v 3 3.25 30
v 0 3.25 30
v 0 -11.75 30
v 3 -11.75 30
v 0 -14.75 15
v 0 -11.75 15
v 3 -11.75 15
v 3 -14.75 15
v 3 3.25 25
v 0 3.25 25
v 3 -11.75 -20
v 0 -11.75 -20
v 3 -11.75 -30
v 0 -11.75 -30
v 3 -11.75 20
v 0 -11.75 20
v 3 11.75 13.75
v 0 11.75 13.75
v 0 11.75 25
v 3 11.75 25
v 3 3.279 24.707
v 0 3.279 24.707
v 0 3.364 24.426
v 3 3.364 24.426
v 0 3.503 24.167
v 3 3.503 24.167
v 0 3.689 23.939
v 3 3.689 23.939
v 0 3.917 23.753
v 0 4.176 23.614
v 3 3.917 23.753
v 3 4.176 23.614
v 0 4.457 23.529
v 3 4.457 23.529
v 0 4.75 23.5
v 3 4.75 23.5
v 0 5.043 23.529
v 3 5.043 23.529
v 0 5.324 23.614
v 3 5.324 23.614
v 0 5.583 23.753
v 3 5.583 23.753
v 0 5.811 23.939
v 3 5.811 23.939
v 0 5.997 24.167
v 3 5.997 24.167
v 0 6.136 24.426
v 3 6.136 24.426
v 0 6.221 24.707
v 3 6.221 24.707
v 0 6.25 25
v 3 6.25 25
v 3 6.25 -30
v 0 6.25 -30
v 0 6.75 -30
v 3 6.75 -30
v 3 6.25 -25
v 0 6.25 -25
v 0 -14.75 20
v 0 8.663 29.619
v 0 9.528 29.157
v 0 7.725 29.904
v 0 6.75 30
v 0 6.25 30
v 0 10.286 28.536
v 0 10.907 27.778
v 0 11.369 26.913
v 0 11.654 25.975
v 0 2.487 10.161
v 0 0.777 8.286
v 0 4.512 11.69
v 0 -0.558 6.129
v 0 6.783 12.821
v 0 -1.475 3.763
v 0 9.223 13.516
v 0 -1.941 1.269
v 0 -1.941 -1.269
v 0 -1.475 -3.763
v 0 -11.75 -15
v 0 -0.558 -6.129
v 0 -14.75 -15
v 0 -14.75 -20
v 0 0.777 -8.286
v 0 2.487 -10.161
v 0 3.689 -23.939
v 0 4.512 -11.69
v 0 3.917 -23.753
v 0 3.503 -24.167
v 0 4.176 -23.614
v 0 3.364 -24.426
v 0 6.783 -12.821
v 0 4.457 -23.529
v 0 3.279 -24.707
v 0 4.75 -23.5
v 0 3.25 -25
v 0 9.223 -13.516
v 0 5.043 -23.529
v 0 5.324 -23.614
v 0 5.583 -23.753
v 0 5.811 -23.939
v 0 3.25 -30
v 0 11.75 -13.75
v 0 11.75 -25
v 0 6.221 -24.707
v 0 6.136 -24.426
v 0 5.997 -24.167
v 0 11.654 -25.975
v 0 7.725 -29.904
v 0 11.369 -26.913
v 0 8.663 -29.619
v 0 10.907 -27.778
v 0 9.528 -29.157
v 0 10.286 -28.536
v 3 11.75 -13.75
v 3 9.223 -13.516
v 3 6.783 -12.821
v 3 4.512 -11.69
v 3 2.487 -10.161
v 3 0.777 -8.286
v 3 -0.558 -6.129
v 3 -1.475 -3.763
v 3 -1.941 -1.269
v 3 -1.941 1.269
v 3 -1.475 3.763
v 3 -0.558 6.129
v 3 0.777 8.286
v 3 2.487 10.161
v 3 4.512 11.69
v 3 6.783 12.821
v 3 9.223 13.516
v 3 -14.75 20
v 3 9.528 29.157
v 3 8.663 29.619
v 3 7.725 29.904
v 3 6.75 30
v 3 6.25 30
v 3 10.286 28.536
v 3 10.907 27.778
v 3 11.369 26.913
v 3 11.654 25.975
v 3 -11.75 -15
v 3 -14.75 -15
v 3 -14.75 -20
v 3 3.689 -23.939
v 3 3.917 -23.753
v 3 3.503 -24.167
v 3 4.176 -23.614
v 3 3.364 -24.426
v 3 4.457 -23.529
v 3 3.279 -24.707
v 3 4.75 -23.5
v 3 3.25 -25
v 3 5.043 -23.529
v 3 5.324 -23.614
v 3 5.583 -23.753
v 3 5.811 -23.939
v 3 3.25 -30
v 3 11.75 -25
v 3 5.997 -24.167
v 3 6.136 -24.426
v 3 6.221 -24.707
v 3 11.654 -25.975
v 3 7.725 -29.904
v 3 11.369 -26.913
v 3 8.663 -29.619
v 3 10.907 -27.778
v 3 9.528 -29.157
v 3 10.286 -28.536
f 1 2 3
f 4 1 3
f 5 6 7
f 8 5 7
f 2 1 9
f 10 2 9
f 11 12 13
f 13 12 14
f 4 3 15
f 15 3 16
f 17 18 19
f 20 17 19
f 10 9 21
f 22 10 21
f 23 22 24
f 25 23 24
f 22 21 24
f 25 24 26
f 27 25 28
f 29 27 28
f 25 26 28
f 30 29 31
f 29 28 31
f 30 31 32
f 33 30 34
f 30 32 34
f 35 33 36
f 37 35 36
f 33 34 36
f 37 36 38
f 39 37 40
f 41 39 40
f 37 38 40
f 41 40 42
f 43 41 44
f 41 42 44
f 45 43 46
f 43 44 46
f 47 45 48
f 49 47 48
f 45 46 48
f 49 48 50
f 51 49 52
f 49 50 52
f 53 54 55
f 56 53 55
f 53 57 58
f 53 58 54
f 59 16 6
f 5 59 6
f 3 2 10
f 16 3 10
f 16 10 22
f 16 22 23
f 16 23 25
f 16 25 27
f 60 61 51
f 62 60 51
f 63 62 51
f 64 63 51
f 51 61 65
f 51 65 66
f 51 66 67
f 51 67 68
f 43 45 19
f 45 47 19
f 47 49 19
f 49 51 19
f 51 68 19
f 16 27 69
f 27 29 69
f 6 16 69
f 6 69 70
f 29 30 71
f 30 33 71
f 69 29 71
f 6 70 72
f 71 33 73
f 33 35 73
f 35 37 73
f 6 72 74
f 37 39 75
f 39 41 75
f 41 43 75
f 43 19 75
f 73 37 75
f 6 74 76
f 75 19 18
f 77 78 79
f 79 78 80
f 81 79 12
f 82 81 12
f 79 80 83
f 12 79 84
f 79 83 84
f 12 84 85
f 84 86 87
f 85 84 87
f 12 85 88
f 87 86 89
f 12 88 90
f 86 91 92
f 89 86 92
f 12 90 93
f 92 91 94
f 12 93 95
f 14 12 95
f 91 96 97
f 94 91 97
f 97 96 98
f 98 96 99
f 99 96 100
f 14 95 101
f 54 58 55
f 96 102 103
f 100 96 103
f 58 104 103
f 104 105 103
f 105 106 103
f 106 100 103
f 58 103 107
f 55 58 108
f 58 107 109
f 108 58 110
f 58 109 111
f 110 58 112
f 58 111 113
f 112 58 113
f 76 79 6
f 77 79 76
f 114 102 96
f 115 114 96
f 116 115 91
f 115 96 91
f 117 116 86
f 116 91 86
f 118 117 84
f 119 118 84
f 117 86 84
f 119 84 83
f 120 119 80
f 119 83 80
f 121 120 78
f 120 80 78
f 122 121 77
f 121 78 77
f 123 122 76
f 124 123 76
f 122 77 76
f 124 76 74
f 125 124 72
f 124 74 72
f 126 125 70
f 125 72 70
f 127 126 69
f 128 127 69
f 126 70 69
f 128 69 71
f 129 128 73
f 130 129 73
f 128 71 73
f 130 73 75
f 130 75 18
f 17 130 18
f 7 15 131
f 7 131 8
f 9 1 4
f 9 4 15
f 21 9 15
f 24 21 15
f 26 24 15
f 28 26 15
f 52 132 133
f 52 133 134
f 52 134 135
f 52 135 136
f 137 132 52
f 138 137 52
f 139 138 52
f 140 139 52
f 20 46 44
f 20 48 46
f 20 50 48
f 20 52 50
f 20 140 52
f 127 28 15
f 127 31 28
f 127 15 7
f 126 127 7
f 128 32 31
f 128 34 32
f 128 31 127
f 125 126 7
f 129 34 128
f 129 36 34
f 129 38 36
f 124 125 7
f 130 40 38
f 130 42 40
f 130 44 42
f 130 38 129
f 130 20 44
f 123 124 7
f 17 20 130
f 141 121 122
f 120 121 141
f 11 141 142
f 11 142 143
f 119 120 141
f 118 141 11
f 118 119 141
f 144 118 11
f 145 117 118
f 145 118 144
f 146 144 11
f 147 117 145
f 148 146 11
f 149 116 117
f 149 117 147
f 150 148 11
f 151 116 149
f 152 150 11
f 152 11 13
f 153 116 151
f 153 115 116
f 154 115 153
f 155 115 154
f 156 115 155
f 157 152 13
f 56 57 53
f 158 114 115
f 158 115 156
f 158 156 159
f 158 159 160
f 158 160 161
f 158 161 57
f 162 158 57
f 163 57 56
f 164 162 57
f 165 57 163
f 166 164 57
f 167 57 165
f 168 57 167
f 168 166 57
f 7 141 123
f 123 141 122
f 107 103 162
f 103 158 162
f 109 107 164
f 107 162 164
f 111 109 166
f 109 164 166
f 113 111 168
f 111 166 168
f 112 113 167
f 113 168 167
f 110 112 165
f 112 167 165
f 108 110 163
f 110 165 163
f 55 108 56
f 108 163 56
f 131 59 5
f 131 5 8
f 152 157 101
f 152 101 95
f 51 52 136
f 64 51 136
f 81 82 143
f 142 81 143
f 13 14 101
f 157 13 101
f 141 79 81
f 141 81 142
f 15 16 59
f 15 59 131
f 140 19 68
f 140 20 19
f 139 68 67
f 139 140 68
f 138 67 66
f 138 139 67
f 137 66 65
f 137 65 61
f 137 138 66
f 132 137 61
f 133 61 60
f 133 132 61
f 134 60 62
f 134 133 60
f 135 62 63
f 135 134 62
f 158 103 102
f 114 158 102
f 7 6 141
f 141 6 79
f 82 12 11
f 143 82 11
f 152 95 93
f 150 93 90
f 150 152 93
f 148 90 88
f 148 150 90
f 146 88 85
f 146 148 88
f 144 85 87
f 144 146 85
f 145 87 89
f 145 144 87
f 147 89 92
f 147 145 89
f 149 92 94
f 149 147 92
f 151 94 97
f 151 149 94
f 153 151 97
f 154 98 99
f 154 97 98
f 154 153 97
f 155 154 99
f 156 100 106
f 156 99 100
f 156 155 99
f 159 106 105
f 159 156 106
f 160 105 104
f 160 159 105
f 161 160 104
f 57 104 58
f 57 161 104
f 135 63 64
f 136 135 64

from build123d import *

# Parameters (mm, degrees)
BOSS_EXTRUDE1_DEPTH = 3
CUT_EXTRUDE1_DEPTH  = 4
FILLET1_R           = 5
SKETCH3_W           = 3
SKETCH3_H           = 5
BOSS_EXTRUDE2_DEPTH = 3


with BuildPart() as part:
    # Sketch1 → Boss-Extrude1 (new body)
    with BuildSketch(Plane(origin=(0, 0, 0), x_dir=(0, 0, -1), z_dir=(1, 0, 0))):
        with BuildLine():
            Line((-13.75, 11.75), (-30, 11.75))
            Line((-30, 11.75), (-30, -11.75))
            Line((-30, -11.75), (30, -11.75))
            Line((30, -11.75), (30, 11.75))
            Line((30, 11.75), (13.75, 11.75))
            ThreePointArc((13.75, 11.75), (0, -2), (-13.75, 11.75))
        make_face()
    extrude(amount=BOSS_EXTRUDE1_DEPTH)

    # Sketch2 → Cut-Extrude1 (cut, through all)
    with BuildSketch(Plane(origin=(3, 0, 0), x_dir=(0, 0, -1), z_dir=(1, 0, 0))):
        with BuildLine():
            Line((-25, 6.25), (-30, 6.25))
            Line((-30, 6.25), (-30, 3.25))
            Line((-30, 3.25), (-25, 3.25))
            ThreePointArc((-25, 3.25), (-23.5, 4.75), (-25, 6.25))
        make_face()
    cut_extrude1 = extrude(amount=-CUT_EXTRUDE1_DEPTH, mode=Mode.SUBTRACT)

    # Mirror2: Cut-Extrude1 across plane
    add(cut_extrude1.mirror(Plane.XY), mode=Mode.SUBTRACT)

    # Fillet1
    fillet1_edges = [part.edges().sort_by_distance(p)[0] for p in [
        (1.5, 11.75, 30),
        (1.5, 11.75, -30),
    ]]
    fillet(fillet1_edges, radius=FILLET1_R)

    # Sketch3 → Boss-Extrude2 (add)
    with BuildSketch(Plane.XZ.offset(11.75)):
        with Locations((1.5, 17.5)):
            Rectangle(SKETCH3_W, SKETCH3_H)
    boss_extrude2 = extrude(amount=BOSS_EXTRUDE2_DEPTH)

    # Mirror3: Boss-Extrude2 across plane
    add(boss_extrude2.mirror(Plane.XY))


solid = part.part
